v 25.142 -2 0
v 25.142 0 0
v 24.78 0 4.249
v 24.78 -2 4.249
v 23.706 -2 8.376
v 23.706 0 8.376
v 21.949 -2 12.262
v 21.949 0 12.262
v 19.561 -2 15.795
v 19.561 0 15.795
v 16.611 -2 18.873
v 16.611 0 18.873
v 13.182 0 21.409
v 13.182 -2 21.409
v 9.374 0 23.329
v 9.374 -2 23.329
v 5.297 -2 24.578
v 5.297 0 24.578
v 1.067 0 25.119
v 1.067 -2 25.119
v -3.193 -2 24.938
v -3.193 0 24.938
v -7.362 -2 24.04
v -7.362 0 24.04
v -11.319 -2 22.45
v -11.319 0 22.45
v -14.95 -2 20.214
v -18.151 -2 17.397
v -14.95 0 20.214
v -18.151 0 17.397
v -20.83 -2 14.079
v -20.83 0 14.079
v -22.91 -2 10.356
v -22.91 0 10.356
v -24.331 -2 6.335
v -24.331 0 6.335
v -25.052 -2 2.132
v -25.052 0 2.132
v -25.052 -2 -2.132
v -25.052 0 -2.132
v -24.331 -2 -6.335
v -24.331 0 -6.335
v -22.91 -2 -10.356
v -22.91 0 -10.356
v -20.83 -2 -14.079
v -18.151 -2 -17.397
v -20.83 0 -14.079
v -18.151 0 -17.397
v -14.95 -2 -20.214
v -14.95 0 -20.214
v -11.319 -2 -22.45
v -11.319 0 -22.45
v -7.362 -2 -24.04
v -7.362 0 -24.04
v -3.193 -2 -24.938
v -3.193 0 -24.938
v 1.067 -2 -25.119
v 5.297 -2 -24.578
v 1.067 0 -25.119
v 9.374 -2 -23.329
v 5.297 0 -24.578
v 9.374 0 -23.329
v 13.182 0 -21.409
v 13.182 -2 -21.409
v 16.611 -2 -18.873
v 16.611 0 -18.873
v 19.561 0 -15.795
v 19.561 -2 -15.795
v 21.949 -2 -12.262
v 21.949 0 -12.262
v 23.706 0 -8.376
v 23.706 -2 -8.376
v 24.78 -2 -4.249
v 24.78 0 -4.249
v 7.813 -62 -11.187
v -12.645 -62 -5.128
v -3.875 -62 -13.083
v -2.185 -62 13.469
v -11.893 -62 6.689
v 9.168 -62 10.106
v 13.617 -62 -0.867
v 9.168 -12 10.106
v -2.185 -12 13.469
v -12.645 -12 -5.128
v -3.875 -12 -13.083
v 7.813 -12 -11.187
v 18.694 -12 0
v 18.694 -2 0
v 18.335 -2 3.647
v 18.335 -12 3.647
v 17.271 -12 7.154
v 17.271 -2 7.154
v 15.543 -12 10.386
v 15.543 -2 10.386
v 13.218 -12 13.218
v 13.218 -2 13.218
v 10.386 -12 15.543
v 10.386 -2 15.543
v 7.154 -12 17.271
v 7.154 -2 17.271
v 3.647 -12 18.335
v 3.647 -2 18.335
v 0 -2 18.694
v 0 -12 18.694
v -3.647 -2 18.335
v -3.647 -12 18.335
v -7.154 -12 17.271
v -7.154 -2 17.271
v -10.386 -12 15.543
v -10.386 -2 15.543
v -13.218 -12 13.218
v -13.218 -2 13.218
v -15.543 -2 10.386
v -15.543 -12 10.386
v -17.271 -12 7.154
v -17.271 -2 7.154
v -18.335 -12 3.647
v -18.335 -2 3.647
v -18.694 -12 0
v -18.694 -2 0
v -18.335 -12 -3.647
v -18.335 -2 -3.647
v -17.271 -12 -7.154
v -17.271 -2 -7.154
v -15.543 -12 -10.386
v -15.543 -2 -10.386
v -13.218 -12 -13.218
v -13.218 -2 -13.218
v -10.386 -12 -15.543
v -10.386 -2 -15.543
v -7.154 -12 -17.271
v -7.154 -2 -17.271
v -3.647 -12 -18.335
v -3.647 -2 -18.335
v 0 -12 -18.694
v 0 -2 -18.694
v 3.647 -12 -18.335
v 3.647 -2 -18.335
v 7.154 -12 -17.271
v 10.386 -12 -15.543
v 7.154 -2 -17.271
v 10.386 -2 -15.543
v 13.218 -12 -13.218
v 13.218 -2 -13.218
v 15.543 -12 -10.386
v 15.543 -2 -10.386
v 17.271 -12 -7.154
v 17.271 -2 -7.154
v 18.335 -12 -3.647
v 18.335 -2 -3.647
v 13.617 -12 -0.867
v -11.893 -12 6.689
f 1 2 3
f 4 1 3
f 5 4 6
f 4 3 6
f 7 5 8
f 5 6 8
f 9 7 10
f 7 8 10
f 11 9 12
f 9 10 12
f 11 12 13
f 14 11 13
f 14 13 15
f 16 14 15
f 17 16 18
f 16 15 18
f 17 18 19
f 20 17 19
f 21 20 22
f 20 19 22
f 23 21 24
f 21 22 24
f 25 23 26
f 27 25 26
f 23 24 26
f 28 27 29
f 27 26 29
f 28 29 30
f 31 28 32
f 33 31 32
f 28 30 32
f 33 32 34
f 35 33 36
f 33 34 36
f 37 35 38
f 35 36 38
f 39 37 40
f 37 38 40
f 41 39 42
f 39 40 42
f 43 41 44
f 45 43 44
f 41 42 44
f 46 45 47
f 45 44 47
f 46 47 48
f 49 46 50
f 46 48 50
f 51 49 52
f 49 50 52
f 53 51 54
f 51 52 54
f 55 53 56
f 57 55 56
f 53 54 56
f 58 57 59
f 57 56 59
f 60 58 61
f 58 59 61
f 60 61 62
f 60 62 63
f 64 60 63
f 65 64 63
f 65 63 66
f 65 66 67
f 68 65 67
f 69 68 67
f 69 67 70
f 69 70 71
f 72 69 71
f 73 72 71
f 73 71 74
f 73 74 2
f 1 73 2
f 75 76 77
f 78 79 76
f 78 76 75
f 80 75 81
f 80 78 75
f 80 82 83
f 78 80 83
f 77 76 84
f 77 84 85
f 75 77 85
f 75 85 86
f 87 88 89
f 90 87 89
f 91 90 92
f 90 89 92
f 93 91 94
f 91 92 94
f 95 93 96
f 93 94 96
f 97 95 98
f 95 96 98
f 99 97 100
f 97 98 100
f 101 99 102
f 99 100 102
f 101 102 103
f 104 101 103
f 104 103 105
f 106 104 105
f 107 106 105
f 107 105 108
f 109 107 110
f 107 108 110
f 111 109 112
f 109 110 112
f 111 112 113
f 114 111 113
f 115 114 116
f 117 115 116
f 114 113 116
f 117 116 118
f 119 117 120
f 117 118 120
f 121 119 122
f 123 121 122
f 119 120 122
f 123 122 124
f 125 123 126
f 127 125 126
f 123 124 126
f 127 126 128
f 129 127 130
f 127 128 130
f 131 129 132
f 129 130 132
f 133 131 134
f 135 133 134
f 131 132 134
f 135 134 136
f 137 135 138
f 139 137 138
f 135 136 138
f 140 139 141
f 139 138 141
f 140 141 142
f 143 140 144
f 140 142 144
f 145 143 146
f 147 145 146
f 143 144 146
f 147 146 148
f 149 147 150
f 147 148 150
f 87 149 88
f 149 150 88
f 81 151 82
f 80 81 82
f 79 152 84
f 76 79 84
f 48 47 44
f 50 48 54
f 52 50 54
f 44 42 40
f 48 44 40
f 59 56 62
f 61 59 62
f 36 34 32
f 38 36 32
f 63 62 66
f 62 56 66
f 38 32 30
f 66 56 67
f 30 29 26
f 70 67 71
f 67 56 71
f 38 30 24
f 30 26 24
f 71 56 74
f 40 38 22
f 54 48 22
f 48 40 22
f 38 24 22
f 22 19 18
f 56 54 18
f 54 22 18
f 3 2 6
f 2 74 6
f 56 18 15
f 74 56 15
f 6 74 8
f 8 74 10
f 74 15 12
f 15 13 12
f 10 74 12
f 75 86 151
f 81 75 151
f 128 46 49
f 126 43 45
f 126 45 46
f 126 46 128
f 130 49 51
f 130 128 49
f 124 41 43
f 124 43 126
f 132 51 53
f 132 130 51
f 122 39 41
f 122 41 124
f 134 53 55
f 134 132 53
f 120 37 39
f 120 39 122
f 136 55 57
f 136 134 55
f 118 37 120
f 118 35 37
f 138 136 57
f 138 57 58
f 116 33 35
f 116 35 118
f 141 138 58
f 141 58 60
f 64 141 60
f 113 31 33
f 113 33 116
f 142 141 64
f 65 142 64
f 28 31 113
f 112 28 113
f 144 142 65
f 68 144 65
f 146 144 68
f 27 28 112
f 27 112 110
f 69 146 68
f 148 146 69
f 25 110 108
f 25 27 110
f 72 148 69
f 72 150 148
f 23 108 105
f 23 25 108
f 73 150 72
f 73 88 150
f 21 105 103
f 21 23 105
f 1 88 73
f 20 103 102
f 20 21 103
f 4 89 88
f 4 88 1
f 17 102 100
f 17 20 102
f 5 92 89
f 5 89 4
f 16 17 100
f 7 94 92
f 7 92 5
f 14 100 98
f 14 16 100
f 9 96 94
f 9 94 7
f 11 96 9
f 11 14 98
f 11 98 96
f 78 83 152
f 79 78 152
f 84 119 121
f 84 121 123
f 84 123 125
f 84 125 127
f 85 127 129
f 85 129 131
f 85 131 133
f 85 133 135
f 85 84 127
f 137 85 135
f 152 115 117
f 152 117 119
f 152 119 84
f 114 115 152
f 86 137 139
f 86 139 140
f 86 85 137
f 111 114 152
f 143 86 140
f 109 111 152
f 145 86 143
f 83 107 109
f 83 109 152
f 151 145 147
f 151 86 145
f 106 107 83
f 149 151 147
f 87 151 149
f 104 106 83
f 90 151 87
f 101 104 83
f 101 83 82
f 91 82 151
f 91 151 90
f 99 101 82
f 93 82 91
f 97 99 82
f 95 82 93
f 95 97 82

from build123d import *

# Parameters (mm, degrees)
F0_R     = 25.142108
F1_DEPTH = 2
F2_R     = 18.693726
F3_DEPTH = 10
F5_DEPTH = 50


with BuildPart() as f1:
    # F0 (on Front) → F1 (new body)
    with BuildSketch(Plane.XZ):
        Circle(F0_R)
    extrude(amount=F1_DEPTH)

    # F2 (on face) → F3 (join)
    with BuildSketch(Plane.XZ.offset(2)):
        Circle(F2_R)
    extrude(amount=F3_DEPTH)

    # F4 (on face) → F5 (join)
    with BuildSketch(Plane.XZ.offset(12)):
        Polygon((-12.644799, -5.127543), (-3.875029, -13.083073), (7.812717, -11.186782), (13.617328, -0.866616), (9.167813, 10.106129), (-2.185252, 13.468753), (-11.892778, 6.689131), align=None)
    extrude(amount=F5_DEPTH)


solid = f1.part
